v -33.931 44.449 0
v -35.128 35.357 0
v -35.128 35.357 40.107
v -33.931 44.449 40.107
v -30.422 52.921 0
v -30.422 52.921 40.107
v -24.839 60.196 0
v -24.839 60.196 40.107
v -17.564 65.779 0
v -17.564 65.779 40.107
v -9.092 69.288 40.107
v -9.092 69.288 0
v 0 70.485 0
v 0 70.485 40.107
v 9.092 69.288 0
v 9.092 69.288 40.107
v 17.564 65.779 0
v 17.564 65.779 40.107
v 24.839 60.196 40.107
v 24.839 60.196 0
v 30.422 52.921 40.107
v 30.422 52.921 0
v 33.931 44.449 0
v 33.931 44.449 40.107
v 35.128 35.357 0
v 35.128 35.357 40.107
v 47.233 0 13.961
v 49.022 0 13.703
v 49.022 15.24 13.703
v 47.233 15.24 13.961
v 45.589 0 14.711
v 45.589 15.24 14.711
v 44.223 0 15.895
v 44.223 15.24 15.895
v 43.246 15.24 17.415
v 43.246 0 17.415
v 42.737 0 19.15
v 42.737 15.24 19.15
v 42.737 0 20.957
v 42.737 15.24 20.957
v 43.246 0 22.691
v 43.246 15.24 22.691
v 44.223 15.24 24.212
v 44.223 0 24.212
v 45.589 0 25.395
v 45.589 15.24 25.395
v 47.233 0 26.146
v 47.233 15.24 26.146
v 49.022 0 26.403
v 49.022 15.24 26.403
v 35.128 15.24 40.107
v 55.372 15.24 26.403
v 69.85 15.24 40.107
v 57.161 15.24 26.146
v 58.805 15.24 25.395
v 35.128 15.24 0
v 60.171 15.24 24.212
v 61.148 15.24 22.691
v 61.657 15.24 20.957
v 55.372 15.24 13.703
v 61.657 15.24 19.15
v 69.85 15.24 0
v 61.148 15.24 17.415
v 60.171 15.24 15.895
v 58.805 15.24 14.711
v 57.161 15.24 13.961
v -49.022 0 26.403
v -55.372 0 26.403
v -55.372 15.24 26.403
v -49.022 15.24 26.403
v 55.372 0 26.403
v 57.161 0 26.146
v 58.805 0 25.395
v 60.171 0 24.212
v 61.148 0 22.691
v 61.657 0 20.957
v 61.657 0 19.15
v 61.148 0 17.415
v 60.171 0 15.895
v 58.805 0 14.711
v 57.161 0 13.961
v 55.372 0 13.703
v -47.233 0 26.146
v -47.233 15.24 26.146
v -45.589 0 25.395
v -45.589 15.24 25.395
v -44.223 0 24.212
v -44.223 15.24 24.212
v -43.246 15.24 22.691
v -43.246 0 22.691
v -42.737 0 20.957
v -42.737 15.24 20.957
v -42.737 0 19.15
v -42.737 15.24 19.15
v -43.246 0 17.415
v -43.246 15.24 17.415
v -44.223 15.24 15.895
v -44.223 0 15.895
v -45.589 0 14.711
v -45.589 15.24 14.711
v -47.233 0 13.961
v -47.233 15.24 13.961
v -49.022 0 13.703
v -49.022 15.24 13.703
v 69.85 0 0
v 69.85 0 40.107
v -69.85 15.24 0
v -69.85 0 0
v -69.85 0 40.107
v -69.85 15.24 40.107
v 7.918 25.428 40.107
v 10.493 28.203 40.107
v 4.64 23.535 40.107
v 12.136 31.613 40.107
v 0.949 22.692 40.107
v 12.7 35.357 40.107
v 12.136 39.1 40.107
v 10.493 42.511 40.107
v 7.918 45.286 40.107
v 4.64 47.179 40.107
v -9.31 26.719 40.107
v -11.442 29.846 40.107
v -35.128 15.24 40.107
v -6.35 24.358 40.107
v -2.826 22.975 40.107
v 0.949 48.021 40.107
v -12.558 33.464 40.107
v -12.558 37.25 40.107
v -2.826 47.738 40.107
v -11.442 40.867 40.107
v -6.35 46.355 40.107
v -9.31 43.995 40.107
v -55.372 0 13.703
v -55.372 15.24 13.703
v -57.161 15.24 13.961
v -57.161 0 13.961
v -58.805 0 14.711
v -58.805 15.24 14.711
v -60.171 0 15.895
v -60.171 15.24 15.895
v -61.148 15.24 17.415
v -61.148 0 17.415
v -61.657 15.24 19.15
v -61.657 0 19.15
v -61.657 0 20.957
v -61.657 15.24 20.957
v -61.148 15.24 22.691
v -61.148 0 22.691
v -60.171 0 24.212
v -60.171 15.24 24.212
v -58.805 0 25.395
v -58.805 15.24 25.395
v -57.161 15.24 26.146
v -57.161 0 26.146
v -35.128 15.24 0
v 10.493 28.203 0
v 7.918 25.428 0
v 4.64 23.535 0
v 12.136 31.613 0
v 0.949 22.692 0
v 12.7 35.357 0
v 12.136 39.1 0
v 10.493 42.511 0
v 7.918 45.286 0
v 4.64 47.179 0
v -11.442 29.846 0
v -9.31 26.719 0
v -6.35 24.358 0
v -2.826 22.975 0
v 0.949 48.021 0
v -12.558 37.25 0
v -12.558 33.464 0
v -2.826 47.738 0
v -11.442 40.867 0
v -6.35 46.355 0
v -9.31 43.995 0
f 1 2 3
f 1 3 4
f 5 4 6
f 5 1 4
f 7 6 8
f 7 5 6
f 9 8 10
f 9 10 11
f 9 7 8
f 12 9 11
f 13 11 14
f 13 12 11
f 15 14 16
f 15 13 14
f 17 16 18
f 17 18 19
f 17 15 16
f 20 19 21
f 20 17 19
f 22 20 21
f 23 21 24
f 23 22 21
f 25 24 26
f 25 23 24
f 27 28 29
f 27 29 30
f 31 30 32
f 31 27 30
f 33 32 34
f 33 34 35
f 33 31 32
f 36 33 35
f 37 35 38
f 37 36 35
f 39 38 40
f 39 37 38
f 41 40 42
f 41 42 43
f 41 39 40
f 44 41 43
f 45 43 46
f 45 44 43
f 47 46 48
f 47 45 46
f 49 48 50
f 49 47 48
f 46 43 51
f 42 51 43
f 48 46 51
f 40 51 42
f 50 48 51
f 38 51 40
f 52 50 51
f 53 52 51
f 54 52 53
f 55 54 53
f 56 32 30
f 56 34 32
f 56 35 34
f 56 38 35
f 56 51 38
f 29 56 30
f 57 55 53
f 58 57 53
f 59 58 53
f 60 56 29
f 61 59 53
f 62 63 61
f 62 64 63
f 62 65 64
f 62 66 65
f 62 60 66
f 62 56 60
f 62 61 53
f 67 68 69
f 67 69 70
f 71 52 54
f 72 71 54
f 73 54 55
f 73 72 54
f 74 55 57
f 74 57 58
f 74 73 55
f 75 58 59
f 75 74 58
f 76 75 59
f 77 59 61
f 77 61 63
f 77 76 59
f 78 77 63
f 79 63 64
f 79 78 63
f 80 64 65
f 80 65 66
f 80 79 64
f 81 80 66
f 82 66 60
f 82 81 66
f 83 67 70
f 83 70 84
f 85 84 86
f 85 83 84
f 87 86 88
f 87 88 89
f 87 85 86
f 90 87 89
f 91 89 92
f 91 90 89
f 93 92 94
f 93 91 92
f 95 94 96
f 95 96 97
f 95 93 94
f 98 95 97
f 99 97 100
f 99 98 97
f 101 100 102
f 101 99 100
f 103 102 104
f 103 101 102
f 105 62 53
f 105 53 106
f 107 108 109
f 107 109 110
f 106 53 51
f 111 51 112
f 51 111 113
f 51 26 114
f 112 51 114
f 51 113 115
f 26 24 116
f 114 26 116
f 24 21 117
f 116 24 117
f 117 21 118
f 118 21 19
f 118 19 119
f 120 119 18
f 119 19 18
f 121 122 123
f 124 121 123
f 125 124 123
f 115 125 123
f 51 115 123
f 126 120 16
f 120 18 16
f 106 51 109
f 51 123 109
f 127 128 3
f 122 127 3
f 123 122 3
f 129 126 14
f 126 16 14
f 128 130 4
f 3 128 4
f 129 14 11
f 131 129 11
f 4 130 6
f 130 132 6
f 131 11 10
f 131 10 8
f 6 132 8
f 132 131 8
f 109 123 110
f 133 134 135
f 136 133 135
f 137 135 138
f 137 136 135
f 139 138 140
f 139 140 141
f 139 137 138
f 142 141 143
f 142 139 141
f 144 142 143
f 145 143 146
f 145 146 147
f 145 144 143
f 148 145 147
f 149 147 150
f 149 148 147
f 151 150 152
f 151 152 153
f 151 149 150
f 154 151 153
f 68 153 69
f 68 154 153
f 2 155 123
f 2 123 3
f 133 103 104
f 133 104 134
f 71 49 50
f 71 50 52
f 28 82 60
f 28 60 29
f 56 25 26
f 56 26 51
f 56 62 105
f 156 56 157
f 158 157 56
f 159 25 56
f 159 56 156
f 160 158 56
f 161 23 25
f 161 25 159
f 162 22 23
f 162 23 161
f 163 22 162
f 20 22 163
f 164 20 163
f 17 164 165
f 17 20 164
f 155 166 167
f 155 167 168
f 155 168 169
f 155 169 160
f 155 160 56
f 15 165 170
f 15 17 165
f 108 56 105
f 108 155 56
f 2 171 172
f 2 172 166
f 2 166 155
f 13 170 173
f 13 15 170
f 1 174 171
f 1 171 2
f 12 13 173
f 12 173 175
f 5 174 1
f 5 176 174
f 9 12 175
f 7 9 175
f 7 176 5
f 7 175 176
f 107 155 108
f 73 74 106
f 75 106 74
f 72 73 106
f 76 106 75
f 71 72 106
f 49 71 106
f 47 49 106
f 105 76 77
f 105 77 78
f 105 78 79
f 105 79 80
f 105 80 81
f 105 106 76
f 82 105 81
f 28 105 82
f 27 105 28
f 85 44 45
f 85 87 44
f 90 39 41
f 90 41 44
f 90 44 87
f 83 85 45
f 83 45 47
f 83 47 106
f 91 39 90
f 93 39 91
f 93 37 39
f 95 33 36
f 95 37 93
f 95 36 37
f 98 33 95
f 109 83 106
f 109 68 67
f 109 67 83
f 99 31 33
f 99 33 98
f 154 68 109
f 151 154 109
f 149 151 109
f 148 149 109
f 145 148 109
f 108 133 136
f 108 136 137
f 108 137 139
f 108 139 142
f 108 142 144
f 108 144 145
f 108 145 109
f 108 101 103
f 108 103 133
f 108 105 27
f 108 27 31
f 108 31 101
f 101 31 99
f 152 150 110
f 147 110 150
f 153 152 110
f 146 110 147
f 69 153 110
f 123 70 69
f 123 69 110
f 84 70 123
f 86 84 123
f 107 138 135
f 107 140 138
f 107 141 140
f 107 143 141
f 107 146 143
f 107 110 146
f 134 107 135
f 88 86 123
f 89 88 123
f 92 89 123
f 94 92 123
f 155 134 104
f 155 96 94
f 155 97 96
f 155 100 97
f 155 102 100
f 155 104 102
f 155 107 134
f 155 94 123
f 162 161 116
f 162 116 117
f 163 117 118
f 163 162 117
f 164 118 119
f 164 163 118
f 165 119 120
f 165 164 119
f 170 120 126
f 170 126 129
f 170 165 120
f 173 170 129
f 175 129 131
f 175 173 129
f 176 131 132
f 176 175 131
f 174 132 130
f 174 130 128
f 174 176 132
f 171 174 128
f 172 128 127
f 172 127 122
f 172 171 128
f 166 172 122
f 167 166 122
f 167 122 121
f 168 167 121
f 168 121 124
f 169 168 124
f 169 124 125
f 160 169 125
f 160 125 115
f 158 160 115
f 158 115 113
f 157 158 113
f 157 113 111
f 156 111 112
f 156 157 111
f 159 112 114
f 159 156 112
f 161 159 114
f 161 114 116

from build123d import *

# Parameters (mm, degrees)
SKETCH2_R                      = 12.7
BOSS_EXTRUDE1_DEPTH            = 40.1066
F_1_2_0_5_DIAMETER_SLOT1_DEPTH = 15.24


# Read off the part's stored shape, not the designer's step: 1/2 (0.5) Diameter Slot1
with BuildPart() as part:
    # Sketch2 → Boss-Extrude1 (new body)
    with BuildSketch(Plane.XY):
        with BuildLine():
            Line((69.85, 0), (-69.85, 0))
            Line((-69.85, 0), (-69.85, 15.24))
            Line((-69.85, 15.24), (-35.1282, 15.24))
            Line((-35.1282, 15.24), (-35.1282, 35.3568))
            ThreePointArc((-35.1282, 35.3568), (0, 70.485), (35.1282, 35.3568))
            Line((35.1282, 35.3568), (35.1282, 15.24))
            Line((35.1282, 15.24), (69.85, 15.24))
            Line((69.85, 15.24), (69.85, 0))
        make_face()
        with Locations((0, 35.3568)):
            Circle(SKETCH2_R, mode=Mode.SUBTRACT)
    extrude(amount=BOSS_EXTRUDE1_DEPTH)

    # 1/2 (0.5) Diameter Slot1 outline → 1/2 (0.5) Diameter Slot1 (cut)
    with BuildSketch(Plane(origin=(0, 0, 0), x_dir=(1, 0, 0), z_dir=(0, 1, 0))):
        with BuildLine():
            Line((-55.372, -26.4033), (-49.022, -26.4033))
            ThreePointArc((-49.022, -26.4033), (-42.672, -20.0533), (-49.022, -13.7033))
            Line((-49.022, -13.7033), (-55.372, -13.7033))
            ThreePointArc((-55.372, -13.7033), (-61.722, -20.0533), (-55.372, -26.4033))
        make_face()
        with BuildLine():
            ThreePointArc((55.372, -26.4033), (61.722, -20.0533), (55.372, -13.7033))
            Line((55.372, -13.7033), (49.022, -13.7033))
            ThreePointArc((49.022, -13.7033), (42.672, -20.0533), (49.022, -26.4033))
            Line((49.022, -26.4033), (55.372, -26.4033))
        make_face()
    extrude(amount=F_1_2_0_5_DIAMETER_SLOT1_DEPTH, mode=Mode.SUBTRACT)


solid = part.part
